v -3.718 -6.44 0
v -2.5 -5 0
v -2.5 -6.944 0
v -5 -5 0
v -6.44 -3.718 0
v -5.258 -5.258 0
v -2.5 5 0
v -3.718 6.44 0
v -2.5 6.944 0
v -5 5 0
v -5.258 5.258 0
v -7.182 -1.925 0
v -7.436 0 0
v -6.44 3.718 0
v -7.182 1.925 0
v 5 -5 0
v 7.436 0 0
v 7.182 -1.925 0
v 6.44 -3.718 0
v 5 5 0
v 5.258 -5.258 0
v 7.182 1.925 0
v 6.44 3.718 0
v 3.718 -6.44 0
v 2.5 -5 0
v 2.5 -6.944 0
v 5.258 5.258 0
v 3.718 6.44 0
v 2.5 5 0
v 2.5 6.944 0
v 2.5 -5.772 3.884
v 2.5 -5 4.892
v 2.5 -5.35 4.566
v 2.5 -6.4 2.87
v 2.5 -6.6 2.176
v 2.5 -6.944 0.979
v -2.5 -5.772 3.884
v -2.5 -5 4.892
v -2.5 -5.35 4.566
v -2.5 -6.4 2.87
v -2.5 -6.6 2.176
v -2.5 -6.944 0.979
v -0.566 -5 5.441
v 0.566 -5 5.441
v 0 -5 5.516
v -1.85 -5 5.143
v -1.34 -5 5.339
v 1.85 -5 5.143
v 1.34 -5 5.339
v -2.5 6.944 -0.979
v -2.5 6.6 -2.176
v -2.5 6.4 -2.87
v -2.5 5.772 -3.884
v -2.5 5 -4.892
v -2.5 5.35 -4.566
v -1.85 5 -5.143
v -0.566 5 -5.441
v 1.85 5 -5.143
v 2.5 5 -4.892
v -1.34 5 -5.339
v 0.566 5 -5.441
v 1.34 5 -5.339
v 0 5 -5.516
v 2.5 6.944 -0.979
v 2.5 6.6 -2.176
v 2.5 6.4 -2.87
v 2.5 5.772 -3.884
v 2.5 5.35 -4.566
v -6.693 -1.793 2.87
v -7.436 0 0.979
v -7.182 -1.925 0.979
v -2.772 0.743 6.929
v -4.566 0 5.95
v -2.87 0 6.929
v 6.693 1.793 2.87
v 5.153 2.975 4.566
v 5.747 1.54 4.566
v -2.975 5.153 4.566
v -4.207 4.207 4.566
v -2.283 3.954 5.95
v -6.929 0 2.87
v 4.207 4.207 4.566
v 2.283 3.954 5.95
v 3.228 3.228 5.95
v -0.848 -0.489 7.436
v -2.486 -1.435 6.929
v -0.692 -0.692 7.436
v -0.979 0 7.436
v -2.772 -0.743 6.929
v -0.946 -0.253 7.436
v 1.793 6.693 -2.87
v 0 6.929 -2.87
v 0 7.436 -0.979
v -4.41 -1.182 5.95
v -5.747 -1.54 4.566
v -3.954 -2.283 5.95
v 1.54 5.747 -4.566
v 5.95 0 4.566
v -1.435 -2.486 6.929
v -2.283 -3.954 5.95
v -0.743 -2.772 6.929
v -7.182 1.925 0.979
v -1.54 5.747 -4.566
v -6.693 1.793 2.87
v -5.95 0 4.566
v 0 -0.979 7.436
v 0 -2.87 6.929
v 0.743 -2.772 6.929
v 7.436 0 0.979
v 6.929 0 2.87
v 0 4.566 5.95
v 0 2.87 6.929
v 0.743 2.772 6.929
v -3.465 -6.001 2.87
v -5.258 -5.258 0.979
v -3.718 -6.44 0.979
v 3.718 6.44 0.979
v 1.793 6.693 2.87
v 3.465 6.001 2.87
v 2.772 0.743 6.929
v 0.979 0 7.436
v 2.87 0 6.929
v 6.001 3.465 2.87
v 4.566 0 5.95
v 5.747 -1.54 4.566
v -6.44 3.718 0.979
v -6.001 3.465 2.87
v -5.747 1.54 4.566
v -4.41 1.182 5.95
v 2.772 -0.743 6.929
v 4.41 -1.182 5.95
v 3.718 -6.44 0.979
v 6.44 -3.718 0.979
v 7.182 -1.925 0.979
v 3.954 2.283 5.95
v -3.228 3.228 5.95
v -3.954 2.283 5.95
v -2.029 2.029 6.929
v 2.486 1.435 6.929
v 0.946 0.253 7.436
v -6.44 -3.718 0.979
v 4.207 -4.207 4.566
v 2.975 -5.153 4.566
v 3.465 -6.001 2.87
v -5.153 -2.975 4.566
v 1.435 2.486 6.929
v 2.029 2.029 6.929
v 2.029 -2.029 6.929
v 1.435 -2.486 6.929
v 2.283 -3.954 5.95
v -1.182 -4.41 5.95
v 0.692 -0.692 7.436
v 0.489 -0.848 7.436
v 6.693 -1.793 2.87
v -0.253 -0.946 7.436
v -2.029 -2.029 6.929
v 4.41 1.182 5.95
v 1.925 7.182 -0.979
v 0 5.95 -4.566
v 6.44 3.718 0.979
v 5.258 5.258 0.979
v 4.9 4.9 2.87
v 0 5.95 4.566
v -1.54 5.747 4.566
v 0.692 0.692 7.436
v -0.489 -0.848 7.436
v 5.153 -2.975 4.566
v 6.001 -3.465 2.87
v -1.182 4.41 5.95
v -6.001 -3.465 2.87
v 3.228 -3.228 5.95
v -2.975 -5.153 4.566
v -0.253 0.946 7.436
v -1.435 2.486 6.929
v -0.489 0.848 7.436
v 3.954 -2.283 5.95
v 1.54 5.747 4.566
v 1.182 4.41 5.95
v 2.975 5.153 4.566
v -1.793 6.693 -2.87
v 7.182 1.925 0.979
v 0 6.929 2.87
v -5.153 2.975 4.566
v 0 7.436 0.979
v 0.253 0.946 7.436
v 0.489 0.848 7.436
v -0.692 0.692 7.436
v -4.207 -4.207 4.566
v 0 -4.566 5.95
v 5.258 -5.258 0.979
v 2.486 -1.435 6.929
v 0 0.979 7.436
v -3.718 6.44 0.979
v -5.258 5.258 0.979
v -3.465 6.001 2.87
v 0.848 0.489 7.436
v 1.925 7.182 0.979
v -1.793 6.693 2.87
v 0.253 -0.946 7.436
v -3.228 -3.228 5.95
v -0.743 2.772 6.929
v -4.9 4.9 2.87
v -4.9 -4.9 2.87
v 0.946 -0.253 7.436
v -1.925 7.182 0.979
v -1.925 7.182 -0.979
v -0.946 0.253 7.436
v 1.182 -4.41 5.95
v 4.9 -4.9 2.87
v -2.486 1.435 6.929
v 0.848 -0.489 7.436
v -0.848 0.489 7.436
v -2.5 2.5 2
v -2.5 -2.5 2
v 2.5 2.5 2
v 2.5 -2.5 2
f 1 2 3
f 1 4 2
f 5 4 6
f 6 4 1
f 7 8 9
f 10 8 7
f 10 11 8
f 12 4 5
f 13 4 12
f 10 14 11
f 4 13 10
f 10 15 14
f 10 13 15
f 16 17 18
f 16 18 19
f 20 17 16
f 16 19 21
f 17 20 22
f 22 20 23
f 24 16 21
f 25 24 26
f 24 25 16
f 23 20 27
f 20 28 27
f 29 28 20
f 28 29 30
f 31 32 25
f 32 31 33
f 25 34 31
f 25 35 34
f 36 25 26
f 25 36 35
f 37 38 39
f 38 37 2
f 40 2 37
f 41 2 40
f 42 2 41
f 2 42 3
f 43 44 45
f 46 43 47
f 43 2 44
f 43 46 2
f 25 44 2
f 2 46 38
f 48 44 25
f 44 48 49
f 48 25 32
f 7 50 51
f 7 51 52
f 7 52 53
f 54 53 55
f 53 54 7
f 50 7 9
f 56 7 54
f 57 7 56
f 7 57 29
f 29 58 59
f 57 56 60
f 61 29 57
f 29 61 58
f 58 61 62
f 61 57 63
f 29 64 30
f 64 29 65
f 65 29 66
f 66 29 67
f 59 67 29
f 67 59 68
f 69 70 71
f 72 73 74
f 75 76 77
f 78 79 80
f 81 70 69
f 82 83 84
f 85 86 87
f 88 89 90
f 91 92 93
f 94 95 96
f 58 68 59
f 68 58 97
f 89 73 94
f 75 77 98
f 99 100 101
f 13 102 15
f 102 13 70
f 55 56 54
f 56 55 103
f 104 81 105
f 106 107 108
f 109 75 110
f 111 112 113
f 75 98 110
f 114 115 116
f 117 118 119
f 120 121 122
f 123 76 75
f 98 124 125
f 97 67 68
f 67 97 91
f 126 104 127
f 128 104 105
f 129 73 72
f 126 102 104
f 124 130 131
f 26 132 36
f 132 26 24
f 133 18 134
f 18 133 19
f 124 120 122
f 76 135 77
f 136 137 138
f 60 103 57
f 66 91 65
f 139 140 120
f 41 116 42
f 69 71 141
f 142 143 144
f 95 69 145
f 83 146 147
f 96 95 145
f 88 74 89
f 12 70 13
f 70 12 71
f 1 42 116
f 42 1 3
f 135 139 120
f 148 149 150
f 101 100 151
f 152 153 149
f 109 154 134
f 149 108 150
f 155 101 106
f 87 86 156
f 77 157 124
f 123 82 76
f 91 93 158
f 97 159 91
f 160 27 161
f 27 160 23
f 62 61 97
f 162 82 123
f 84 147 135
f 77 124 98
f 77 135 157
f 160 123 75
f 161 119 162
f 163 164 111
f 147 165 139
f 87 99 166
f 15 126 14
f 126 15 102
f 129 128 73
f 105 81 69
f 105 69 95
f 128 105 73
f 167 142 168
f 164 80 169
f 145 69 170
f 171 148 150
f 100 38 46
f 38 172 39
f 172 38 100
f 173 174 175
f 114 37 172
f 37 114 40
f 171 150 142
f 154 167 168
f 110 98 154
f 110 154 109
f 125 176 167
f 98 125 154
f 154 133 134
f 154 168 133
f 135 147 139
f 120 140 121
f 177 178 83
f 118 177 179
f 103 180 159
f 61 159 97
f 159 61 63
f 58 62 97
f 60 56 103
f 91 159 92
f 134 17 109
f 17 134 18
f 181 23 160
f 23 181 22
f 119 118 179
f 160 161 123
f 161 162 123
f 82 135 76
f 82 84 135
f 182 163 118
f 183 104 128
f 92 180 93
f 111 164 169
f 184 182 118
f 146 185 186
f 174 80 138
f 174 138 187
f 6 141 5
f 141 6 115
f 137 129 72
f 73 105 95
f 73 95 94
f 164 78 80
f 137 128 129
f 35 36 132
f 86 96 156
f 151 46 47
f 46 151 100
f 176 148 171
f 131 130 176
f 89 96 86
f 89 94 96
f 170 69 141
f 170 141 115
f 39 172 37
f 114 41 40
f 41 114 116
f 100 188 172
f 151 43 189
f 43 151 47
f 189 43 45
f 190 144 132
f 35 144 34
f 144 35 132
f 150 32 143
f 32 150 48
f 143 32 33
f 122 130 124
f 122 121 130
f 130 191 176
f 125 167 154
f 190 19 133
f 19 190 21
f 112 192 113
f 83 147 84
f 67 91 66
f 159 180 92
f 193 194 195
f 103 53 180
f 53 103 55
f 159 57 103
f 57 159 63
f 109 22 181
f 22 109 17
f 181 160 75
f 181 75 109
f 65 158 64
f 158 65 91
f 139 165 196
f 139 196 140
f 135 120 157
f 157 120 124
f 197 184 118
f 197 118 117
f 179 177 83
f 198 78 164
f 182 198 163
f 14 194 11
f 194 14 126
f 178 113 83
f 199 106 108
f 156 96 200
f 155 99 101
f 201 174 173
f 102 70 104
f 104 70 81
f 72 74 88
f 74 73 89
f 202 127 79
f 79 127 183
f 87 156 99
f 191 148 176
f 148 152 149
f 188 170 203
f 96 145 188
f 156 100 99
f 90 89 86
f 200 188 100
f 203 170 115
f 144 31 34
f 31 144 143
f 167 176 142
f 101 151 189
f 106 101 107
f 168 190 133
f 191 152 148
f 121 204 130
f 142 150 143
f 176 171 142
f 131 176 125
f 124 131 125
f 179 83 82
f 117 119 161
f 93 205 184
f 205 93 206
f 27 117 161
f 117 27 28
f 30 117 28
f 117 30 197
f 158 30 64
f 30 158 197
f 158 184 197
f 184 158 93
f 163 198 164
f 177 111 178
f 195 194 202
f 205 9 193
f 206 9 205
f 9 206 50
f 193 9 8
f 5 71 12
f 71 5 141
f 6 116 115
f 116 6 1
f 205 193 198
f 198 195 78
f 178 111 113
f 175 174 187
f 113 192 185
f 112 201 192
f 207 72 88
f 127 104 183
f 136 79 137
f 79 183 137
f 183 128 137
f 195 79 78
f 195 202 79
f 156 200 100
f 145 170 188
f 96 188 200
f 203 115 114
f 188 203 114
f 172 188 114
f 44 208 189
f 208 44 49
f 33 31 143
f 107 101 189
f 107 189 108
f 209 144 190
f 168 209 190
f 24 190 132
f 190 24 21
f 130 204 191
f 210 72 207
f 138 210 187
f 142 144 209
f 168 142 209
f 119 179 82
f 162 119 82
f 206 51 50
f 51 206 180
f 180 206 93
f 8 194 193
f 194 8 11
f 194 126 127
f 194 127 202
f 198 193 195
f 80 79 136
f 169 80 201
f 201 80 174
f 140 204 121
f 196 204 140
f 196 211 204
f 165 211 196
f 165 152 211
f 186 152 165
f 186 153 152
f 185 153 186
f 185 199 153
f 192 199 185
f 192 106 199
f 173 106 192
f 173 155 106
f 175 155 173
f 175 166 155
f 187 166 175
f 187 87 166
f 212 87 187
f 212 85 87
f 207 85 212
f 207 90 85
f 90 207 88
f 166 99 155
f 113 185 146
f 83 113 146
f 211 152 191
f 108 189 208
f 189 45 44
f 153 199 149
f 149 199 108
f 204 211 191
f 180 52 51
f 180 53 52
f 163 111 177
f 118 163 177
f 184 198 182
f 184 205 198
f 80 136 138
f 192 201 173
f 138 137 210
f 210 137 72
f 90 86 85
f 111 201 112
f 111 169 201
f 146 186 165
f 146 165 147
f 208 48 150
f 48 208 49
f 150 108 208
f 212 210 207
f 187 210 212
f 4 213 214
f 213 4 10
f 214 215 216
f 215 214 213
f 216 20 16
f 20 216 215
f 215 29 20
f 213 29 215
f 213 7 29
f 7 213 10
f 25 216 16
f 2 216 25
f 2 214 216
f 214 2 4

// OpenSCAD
pearl_d = 15;
strip_w = 10;
led_w = 5;
led_h = 2;

module exclusion_zone() {
  translate([-pearl_d/6, -pearl_d/2,0]) cube([
    pearl_d/3, (pearl_d-strip_w)/2, pearl_d]);
}

difference() {
  sphere(d = pearl_d);
  linear_extrude(height = led_h, scale = led_w/strip_w) square(strip_w, center=true);
  difference() {
    union() {
      translate([-pearl_d/2, -pearl_d/2,-pearl_d]) cube(pearl_d);
      exclusion_zone();
    }
    rotate([180,0,0]) exclusion_zone();
  }
}
